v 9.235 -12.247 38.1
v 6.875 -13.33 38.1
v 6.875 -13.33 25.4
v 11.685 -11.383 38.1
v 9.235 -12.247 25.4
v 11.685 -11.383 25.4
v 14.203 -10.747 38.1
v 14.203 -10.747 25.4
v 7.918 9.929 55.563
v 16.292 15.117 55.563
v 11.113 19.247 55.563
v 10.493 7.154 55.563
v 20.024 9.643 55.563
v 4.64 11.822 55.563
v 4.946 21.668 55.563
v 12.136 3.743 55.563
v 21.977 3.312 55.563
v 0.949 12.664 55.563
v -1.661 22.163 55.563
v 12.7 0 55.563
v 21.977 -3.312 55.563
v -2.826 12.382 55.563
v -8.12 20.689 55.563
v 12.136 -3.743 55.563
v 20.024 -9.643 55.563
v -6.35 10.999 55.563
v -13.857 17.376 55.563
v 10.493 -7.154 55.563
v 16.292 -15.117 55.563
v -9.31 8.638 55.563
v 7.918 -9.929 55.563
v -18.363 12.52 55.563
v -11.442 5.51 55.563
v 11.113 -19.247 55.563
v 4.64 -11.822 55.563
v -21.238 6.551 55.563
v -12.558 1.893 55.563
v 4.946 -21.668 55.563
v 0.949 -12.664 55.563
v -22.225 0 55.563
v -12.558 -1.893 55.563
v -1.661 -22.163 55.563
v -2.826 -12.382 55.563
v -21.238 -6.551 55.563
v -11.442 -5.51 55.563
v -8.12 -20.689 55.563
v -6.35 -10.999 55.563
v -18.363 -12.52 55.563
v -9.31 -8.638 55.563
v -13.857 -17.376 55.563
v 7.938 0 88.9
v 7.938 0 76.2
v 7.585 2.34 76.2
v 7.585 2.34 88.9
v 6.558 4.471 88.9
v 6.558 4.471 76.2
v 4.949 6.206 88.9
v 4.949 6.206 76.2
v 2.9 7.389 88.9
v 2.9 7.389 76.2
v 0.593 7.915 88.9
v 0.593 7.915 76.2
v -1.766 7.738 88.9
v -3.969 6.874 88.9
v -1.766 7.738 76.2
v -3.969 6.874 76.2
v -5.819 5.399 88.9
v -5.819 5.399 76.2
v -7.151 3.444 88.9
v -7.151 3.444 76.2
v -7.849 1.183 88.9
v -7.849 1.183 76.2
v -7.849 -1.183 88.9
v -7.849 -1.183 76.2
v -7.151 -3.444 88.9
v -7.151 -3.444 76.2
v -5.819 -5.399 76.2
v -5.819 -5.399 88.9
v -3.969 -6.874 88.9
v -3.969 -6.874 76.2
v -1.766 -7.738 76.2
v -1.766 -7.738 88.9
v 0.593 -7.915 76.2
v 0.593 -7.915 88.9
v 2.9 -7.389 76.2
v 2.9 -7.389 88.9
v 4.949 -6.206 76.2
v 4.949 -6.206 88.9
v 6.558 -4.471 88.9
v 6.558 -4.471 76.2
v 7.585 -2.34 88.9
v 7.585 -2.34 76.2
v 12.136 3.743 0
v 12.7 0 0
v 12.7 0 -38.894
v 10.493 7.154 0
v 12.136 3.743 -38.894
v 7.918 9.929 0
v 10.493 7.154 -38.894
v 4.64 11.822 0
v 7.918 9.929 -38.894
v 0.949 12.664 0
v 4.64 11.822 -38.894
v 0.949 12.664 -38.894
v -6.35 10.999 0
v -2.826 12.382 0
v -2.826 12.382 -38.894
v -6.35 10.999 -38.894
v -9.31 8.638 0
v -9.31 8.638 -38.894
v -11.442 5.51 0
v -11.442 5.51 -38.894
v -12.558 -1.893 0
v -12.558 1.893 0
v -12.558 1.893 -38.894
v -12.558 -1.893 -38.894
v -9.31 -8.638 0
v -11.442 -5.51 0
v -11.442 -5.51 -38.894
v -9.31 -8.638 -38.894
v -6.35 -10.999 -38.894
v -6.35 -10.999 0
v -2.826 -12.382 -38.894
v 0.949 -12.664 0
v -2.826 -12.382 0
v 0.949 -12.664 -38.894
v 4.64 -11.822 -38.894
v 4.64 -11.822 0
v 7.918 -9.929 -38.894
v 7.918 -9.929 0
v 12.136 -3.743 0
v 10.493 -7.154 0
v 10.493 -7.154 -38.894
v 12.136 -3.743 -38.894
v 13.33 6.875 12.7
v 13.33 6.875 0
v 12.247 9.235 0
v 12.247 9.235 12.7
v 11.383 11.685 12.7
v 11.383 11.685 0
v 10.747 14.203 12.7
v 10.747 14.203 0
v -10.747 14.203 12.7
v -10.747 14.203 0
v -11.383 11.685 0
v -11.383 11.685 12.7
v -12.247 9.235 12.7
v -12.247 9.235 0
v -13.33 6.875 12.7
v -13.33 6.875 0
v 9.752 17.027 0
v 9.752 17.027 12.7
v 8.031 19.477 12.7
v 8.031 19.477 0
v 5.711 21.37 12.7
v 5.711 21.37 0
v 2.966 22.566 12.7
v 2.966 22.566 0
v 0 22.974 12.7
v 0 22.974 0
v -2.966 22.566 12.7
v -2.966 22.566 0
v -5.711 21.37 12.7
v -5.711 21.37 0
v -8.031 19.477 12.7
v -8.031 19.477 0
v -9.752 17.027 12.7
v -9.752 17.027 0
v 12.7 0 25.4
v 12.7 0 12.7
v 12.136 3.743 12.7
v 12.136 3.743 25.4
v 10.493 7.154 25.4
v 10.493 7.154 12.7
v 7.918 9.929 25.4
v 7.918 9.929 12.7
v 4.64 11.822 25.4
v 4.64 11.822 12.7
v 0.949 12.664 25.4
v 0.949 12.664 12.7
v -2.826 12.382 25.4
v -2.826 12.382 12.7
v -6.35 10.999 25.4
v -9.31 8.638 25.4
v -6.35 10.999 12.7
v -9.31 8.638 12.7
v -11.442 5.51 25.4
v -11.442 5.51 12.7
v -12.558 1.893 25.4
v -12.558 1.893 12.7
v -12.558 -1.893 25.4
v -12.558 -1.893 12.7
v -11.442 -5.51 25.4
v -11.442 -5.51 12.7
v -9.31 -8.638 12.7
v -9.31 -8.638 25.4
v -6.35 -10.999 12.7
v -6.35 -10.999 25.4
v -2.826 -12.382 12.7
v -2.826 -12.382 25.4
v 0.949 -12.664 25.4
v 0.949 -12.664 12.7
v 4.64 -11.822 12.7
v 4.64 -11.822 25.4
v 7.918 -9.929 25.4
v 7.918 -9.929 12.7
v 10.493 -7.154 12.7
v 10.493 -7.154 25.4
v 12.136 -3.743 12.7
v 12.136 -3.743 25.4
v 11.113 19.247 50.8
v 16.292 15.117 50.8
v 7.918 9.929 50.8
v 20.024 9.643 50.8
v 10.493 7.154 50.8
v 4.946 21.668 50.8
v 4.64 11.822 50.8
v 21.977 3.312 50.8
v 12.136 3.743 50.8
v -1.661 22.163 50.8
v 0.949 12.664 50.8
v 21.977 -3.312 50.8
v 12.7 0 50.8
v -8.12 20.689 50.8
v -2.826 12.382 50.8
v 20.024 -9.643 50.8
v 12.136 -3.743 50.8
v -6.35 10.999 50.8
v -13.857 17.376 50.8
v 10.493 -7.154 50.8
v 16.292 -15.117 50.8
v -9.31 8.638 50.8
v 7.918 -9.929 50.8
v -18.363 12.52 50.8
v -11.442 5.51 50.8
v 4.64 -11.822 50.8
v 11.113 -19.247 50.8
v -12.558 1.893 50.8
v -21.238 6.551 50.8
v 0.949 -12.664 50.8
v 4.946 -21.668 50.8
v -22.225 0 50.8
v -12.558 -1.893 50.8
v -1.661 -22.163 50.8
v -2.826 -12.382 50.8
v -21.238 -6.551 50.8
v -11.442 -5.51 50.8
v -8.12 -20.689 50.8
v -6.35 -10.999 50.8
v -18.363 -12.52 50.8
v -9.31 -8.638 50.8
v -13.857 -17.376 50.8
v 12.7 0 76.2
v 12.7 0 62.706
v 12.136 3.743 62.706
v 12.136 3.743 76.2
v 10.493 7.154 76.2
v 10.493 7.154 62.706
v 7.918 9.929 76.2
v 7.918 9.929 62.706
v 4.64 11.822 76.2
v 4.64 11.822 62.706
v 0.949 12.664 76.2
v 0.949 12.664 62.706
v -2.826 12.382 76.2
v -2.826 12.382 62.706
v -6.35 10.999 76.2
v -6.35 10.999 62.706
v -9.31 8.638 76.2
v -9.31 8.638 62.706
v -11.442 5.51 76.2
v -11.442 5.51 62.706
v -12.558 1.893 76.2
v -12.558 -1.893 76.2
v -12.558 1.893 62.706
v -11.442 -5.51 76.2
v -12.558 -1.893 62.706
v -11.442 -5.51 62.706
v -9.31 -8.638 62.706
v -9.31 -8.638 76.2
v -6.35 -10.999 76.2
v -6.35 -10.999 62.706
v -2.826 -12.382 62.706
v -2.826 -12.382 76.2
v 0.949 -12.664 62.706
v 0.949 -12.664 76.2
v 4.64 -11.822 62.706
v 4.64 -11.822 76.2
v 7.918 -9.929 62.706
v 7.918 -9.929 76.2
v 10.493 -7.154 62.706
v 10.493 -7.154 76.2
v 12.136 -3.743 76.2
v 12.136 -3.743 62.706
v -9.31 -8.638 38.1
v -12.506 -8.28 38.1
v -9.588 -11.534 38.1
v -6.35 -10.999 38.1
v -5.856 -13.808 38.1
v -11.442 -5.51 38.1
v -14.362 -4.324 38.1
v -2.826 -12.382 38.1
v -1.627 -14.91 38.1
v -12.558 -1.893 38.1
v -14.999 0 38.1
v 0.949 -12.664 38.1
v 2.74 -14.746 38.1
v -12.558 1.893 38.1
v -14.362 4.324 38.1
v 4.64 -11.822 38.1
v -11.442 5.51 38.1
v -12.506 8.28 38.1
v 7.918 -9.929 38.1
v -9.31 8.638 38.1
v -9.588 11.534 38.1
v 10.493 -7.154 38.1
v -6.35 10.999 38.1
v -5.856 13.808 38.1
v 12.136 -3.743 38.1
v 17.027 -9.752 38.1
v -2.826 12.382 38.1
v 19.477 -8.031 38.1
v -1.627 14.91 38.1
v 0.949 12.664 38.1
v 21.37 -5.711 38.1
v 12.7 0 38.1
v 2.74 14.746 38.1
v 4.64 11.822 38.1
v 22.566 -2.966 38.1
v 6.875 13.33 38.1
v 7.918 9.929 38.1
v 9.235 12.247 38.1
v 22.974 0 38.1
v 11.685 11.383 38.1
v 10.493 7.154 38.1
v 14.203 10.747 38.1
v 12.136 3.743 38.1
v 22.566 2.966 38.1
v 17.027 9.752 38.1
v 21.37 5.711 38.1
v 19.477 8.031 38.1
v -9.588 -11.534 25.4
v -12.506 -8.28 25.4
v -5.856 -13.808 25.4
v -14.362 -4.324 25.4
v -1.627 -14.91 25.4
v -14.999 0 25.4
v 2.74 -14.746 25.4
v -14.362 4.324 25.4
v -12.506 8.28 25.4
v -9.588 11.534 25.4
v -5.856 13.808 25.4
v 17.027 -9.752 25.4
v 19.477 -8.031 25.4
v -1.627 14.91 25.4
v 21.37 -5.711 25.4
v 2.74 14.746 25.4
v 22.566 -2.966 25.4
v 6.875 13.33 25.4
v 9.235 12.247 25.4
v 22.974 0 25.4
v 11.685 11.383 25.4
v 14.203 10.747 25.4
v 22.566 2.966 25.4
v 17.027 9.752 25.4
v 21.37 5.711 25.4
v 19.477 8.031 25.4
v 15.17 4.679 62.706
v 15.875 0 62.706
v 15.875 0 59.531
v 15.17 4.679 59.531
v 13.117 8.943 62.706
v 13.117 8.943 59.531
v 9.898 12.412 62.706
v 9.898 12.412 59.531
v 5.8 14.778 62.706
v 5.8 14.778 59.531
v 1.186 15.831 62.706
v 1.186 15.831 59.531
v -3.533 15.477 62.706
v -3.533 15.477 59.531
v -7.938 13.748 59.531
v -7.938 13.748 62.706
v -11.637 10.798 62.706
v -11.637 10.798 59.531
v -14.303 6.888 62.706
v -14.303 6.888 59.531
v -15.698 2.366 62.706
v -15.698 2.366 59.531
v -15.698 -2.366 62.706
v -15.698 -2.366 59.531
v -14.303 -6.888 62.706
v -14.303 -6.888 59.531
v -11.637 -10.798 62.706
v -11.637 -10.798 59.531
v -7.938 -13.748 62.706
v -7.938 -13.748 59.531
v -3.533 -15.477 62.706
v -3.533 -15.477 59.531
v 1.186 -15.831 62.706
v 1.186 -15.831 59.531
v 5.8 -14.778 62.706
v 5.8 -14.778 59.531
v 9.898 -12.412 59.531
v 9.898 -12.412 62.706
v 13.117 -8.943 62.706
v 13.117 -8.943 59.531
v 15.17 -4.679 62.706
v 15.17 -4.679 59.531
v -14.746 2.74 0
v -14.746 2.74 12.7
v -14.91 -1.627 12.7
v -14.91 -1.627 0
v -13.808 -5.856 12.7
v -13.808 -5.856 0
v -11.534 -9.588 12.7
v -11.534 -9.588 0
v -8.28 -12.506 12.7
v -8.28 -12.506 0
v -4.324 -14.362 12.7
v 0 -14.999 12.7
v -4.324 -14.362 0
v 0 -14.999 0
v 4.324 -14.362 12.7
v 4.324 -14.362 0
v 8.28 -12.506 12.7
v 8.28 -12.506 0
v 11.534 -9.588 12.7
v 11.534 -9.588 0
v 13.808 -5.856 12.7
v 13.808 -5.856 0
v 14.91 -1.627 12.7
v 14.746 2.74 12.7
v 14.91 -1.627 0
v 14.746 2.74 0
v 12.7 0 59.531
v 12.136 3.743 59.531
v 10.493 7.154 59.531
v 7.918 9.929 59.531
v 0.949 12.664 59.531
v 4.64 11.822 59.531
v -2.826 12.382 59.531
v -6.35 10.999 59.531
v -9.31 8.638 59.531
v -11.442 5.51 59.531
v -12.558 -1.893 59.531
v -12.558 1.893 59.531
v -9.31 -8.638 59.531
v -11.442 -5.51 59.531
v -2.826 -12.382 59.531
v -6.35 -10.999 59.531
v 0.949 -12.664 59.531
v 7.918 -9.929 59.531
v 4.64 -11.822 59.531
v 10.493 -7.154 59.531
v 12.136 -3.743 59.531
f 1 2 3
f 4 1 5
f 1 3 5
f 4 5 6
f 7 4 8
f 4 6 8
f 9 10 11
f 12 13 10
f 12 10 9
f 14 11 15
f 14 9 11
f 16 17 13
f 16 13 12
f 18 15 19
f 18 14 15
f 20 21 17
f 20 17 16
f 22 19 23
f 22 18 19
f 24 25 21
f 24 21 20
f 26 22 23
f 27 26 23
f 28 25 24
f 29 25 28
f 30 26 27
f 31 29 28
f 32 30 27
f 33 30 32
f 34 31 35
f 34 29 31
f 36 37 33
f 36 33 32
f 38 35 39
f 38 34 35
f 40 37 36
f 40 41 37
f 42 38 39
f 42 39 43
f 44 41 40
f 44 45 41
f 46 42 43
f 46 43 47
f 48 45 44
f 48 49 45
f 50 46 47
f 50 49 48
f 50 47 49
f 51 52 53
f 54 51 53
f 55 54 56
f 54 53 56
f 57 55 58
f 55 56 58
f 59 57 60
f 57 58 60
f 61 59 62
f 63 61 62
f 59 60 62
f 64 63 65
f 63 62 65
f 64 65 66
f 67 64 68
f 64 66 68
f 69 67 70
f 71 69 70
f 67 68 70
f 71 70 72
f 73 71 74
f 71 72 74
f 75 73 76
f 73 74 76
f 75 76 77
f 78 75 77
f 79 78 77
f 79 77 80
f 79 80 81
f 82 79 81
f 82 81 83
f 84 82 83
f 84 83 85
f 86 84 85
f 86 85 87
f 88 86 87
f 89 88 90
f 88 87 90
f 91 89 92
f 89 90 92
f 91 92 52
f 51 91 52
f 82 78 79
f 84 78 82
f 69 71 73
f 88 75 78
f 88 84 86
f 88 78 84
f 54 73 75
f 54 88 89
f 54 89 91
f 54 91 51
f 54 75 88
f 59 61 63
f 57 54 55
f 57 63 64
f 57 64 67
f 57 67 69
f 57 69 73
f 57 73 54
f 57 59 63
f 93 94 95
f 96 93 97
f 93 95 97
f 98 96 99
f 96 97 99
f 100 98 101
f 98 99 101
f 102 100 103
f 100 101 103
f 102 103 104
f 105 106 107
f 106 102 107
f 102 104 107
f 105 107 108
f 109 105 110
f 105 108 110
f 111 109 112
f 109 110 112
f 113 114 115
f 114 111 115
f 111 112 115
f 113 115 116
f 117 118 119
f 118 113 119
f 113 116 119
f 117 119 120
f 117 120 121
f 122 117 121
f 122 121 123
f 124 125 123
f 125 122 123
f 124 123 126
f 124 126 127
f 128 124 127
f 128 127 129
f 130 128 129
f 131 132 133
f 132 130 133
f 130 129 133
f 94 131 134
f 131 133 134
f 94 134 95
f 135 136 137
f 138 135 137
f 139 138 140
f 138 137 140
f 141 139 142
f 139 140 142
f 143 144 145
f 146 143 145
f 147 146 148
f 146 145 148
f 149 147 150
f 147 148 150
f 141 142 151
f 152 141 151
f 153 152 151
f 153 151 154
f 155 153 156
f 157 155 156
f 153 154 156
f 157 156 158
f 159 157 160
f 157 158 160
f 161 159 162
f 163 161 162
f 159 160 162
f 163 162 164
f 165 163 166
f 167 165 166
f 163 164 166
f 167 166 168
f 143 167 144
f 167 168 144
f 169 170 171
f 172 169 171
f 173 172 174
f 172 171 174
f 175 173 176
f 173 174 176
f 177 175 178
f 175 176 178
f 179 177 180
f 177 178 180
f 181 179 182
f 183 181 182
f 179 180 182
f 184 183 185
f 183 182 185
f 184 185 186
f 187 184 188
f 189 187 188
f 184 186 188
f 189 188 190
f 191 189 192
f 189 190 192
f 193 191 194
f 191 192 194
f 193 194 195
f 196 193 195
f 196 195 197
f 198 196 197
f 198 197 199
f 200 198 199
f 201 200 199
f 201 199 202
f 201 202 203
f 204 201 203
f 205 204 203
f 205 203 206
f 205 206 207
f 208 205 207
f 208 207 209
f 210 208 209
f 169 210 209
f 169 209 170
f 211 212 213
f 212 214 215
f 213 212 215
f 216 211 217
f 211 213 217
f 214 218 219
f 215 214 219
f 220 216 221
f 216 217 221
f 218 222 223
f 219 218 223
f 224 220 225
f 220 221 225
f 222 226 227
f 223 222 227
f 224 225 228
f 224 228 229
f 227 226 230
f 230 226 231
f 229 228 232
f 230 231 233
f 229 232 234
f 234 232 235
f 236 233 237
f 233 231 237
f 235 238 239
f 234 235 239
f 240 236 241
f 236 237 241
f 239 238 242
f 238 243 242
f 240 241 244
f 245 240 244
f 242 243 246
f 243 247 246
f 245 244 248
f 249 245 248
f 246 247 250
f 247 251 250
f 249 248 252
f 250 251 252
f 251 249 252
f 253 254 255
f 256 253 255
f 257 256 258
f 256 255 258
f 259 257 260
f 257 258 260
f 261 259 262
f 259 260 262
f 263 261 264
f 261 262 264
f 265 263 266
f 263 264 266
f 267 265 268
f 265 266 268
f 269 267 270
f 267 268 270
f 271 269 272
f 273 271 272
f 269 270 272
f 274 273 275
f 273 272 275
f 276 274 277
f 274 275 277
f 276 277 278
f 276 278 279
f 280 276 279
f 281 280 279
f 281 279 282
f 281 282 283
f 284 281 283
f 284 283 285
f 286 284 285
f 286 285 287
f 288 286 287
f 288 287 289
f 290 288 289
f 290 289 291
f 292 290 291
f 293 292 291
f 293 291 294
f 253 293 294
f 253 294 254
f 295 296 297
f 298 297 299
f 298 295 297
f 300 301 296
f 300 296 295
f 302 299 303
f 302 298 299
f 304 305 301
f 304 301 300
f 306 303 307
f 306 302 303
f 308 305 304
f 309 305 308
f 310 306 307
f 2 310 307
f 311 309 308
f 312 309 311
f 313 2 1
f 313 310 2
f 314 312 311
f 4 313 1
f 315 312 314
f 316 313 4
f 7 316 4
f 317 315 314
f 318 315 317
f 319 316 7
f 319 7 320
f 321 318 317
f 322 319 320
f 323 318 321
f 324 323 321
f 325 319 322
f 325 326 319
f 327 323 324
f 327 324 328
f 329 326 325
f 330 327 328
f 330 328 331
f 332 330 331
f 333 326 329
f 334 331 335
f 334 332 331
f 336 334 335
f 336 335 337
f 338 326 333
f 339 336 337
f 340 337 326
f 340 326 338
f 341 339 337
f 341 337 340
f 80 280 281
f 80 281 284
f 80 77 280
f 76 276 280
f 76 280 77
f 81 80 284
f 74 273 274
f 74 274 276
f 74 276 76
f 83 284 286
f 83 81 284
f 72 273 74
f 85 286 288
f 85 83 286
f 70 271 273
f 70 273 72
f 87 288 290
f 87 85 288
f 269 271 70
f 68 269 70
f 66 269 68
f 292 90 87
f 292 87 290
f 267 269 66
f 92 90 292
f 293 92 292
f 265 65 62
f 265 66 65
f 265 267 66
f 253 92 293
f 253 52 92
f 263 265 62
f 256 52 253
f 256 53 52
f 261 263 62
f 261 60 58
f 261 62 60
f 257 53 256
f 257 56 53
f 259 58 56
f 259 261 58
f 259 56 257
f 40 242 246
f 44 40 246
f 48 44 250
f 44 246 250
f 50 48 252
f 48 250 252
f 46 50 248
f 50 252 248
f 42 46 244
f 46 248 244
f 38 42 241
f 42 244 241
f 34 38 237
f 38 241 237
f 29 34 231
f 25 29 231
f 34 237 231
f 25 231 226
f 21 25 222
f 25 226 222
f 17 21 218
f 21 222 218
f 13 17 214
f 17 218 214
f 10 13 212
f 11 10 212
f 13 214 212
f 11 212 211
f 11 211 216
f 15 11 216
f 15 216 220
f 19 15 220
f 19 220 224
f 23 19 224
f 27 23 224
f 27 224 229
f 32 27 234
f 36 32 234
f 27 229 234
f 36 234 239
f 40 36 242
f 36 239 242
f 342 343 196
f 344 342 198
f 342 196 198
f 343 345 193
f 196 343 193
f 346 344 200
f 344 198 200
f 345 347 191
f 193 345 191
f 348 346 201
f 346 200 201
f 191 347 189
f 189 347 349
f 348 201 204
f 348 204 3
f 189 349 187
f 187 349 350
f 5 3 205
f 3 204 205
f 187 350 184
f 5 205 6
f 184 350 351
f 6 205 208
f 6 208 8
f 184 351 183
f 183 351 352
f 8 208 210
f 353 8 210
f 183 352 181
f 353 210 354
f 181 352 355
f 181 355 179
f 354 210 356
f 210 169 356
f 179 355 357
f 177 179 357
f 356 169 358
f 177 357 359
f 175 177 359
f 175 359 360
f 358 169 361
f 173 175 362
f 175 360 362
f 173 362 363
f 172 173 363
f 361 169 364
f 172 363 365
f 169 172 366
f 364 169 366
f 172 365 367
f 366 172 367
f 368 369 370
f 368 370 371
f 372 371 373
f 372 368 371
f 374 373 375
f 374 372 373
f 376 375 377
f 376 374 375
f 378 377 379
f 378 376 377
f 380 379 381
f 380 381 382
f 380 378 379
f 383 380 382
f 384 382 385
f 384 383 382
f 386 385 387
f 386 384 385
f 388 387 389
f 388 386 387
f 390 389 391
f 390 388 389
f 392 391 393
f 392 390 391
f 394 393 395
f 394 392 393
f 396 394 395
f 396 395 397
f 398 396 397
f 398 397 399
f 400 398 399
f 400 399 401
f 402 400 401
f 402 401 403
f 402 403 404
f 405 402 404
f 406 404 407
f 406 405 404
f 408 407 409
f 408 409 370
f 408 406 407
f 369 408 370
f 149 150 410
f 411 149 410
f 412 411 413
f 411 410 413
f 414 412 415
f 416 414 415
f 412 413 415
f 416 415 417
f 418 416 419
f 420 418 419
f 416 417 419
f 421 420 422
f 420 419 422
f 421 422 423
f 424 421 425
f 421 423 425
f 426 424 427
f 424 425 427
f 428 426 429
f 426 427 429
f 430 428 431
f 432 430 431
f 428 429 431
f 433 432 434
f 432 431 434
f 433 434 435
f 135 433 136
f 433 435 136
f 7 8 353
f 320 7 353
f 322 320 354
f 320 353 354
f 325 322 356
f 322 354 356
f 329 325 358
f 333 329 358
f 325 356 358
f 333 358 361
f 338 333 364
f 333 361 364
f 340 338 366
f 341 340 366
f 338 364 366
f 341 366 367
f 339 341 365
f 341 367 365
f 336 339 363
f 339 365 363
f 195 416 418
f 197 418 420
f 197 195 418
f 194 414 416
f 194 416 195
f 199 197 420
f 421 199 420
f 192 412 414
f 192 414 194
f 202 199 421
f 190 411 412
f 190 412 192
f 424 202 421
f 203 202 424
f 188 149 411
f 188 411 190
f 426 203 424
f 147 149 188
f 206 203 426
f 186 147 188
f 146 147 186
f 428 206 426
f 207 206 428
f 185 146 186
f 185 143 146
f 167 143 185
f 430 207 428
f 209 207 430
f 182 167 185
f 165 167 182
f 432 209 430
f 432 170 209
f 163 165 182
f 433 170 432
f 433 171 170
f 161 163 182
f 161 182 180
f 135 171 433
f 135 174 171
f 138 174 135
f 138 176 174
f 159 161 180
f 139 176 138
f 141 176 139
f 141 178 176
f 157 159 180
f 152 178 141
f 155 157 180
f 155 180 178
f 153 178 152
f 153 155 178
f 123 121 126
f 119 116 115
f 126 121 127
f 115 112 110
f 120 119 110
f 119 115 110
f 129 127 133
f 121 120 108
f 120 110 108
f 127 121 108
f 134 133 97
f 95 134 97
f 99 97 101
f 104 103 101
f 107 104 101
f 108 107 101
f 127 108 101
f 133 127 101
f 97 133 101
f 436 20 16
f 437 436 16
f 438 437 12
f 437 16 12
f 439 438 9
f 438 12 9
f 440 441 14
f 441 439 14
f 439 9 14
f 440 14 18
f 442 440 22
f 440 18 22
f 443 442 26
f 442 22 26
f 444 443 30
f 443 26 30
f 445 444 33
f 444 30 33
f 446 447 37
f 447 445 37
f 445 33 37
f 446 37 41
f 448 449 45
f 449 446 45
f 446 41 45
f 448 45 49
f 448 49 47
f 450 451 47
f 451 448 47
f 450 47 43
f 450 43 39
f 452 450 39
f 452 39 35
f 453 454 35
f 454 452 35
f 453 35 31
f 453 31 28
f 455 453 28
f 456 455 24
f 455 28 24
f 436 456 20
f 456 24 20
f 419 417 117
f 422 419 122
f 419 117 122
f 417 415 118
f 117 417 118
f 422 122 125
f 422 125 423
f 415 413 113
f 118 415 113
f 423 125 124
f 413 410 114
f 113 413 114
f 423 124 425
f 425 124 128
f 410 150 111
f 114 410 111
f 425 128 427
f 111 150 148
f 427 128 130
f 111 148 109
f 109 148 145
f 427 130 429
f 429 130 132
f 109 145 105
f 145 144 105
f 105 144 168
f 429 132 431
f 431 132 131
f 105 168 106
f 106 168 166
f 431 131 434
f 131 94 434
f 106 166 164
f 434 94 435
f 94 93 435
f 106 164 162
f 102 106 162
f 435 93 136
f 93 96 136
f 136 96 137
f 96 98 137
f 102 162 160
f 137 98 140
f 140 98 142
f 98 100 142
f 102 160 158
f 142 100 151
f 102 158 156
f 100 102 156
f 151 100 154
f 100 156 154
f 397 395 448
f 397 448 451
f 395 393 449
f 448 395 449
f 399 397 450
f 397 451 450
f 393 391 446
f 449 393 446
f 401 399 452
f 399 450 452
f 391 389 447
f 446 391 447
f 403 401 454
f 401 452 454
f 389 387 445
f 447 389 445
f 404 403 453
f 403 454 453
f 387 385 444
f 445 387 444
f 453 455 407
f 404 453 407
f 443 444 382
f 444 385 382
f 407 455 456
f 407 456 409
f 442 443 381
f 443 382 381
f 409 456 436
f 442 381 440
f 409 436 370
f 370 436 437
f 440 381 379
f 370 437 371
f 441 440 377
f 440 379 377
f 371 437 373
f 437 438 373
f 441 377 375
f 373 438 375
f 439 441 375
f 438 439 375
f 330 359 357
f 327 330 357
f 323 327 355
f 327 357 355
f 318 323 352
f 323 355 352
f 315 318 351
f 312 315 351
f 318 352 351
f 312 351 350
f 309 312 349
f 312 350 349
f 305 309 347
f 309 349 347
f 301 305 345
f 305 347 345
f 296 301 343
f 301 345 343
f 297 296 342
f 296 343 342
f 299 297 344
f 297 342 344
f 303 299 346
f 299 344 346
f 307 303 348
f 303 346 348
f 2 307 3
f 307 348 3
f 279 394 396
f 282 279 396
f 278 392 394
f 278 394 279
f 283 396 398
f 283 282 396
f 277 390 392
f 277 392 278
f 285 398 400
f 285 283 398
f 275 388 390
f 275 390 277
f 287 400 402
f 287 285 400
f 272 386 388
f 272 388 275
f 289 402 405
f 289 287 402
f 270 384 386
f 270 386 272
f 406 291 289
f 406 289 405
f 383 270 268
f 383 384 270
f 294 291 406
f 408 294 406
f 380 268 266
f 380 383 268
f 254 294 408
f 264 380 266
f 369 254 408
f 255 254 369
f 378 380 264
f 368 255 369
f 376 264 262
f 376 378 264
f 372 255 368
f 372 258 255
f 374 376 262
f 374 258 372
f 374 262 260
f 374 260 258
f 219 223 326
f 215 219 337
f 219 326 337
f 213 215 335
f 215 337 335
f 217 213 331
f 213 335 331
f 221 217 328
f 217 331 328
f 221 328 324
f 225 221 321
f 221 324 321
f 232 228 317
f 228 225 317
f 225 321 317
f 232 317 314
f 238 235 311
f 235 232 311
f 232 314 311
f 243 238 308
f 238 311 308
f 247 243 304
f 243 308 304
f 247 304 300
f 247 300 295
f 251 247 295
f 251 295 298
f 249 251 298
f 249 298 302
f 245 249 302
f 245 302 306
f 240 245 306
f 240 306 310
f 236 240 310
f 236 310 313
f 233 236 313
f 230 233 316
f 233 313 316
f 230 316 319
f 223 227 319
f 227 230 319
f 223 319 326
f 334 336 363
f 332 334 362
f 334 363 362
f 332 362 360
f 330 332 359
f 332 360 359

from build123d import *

# Parameters (mm, degrees)
BOSS_EXTRUDE2_DEPTH      = 12.7
BOSS_EXTRUDE3_DEPTH      = 63.5
BOSS_EXTRUDE3_DEPTH_BACK = 51.59375
SKETCH3_R                = 12.7
CRVPATTERN3_START        = 25.4
CRVPATTERN3_OUTLINE_R    = 12.7
CRVPATTERN3_DEPTH        = 12.7
BOSS_EXTRUDE5_START      = -25.4
SKETCH7_R                = 22.225
BOSS_EXTRUDE5_DEPTH      = 4.7625
BOSS_EXTRUDE7_START      = -13.49375
SKETCH10_R               = 15.875
BOSS_EXTRUDE7_DEPTH      = 3.175
SKETCH9_R                = 7.9375
BOSS_EXTRUDE8_DEPTH      = 12.7


# Read off the part's stored shape, not the designer's step: CrvPattern3
with BuildPart() as part:
    # Sketch2 → Boss-Extrude2 (new body)
    with BuildSketch(Plane.XY):
        with BuildLine():
            ThreePointArc((-10.74656161, 14.203426928), (-11.786721082, 10.450325862), (-13.330377698, 6.874738694))
            ThreePointArc((-13.330377698, 6.874738694), (0, -14.9987), (13.330377698, 6.874738694))
            ThreePointArc((13.330377698, 6.874738694), (11.786721082, 10.450325862), (10.74656161, 14.203426928))
            ThreePointArc((10.74656161, 14.203426928), (0, 22.9743), (-10.74656161, 14.203426928))
        make_face()
    extrude(amount=BOSS_EXTRUDE2_DEPTH)

    # Sketch3 → Boss-Extrude3 (add, two sides: drawn at the far end of the back side and taken through both)
    with BuildSketch(Plane.XY.offset(12.7).offset(-BOSS_EXTRUDE3_DEPTH_BACK)):
        Circle(SKETCH3_R)
    extrude(amount=BOSS_EXTRUDE3_DEPTH + BOSS_EXTRUDE3_DEPTH_BACK)

    # CrvPattern3 outline → CrvPattern3 (add)
    with BuildSketch(Plane.XY.offset(CRVPATTERN3_START)):
        with BuildLine():
            ThreePointArc((6.874738694, 13.330377698), (-14.9987, 0), (6.874738694, -13.330377698))
            ThreePointArc((6.874738694, -13.330377698), (10.450325862, -11.786721082), (14.203426928, -10.74656161))
            ThreePointArc((14.203426928, -10.74656161), (22.9743, 0), (14.203426928, 10.74656161))
            ThreePointArc((14.203426928, 10.74656161), (10.450325862, 11.786721082), (6.874738694, 13.330377698))
        make_face()
        Circle(CRVPATTERN3_OUTLINE_R, mode=Mode.SUBTRACT)
    extrude(amount=CRVPATTERN3_DEPTH)

    # Sketch7 → Boss-Extrude5 (add)
    with BuildSketch(Plane.XY.offset(76.2).offset(BOSS_EXTRUDE5_START)):
        with Locations(Location((0, 0, 0), (0, 0, 180))):
            Circle(SKETCH7_R)
    extrude(amount=BOSS_EXTRUDE5_DEPTH)

    # Sketch10 → Boss-Extrude7 (add)
    with BuildSketch(Plane.XY.offset(76.2).offset(BOSS_EXTRUDE7_START)):
        Circle(SKETCH10_R)
    extrude(amount=-BOSS_EXTRUDE7_DEPTH)

    # Sketch9 → Boss-Extrude8 (add)
    with BuildSketch(Plane.XY.offset(76.2)):
        Circle(SKETCH9_R)
    extrude(amount=BOSS_EXTRUDE8_DEPTH)


solid = part.part
